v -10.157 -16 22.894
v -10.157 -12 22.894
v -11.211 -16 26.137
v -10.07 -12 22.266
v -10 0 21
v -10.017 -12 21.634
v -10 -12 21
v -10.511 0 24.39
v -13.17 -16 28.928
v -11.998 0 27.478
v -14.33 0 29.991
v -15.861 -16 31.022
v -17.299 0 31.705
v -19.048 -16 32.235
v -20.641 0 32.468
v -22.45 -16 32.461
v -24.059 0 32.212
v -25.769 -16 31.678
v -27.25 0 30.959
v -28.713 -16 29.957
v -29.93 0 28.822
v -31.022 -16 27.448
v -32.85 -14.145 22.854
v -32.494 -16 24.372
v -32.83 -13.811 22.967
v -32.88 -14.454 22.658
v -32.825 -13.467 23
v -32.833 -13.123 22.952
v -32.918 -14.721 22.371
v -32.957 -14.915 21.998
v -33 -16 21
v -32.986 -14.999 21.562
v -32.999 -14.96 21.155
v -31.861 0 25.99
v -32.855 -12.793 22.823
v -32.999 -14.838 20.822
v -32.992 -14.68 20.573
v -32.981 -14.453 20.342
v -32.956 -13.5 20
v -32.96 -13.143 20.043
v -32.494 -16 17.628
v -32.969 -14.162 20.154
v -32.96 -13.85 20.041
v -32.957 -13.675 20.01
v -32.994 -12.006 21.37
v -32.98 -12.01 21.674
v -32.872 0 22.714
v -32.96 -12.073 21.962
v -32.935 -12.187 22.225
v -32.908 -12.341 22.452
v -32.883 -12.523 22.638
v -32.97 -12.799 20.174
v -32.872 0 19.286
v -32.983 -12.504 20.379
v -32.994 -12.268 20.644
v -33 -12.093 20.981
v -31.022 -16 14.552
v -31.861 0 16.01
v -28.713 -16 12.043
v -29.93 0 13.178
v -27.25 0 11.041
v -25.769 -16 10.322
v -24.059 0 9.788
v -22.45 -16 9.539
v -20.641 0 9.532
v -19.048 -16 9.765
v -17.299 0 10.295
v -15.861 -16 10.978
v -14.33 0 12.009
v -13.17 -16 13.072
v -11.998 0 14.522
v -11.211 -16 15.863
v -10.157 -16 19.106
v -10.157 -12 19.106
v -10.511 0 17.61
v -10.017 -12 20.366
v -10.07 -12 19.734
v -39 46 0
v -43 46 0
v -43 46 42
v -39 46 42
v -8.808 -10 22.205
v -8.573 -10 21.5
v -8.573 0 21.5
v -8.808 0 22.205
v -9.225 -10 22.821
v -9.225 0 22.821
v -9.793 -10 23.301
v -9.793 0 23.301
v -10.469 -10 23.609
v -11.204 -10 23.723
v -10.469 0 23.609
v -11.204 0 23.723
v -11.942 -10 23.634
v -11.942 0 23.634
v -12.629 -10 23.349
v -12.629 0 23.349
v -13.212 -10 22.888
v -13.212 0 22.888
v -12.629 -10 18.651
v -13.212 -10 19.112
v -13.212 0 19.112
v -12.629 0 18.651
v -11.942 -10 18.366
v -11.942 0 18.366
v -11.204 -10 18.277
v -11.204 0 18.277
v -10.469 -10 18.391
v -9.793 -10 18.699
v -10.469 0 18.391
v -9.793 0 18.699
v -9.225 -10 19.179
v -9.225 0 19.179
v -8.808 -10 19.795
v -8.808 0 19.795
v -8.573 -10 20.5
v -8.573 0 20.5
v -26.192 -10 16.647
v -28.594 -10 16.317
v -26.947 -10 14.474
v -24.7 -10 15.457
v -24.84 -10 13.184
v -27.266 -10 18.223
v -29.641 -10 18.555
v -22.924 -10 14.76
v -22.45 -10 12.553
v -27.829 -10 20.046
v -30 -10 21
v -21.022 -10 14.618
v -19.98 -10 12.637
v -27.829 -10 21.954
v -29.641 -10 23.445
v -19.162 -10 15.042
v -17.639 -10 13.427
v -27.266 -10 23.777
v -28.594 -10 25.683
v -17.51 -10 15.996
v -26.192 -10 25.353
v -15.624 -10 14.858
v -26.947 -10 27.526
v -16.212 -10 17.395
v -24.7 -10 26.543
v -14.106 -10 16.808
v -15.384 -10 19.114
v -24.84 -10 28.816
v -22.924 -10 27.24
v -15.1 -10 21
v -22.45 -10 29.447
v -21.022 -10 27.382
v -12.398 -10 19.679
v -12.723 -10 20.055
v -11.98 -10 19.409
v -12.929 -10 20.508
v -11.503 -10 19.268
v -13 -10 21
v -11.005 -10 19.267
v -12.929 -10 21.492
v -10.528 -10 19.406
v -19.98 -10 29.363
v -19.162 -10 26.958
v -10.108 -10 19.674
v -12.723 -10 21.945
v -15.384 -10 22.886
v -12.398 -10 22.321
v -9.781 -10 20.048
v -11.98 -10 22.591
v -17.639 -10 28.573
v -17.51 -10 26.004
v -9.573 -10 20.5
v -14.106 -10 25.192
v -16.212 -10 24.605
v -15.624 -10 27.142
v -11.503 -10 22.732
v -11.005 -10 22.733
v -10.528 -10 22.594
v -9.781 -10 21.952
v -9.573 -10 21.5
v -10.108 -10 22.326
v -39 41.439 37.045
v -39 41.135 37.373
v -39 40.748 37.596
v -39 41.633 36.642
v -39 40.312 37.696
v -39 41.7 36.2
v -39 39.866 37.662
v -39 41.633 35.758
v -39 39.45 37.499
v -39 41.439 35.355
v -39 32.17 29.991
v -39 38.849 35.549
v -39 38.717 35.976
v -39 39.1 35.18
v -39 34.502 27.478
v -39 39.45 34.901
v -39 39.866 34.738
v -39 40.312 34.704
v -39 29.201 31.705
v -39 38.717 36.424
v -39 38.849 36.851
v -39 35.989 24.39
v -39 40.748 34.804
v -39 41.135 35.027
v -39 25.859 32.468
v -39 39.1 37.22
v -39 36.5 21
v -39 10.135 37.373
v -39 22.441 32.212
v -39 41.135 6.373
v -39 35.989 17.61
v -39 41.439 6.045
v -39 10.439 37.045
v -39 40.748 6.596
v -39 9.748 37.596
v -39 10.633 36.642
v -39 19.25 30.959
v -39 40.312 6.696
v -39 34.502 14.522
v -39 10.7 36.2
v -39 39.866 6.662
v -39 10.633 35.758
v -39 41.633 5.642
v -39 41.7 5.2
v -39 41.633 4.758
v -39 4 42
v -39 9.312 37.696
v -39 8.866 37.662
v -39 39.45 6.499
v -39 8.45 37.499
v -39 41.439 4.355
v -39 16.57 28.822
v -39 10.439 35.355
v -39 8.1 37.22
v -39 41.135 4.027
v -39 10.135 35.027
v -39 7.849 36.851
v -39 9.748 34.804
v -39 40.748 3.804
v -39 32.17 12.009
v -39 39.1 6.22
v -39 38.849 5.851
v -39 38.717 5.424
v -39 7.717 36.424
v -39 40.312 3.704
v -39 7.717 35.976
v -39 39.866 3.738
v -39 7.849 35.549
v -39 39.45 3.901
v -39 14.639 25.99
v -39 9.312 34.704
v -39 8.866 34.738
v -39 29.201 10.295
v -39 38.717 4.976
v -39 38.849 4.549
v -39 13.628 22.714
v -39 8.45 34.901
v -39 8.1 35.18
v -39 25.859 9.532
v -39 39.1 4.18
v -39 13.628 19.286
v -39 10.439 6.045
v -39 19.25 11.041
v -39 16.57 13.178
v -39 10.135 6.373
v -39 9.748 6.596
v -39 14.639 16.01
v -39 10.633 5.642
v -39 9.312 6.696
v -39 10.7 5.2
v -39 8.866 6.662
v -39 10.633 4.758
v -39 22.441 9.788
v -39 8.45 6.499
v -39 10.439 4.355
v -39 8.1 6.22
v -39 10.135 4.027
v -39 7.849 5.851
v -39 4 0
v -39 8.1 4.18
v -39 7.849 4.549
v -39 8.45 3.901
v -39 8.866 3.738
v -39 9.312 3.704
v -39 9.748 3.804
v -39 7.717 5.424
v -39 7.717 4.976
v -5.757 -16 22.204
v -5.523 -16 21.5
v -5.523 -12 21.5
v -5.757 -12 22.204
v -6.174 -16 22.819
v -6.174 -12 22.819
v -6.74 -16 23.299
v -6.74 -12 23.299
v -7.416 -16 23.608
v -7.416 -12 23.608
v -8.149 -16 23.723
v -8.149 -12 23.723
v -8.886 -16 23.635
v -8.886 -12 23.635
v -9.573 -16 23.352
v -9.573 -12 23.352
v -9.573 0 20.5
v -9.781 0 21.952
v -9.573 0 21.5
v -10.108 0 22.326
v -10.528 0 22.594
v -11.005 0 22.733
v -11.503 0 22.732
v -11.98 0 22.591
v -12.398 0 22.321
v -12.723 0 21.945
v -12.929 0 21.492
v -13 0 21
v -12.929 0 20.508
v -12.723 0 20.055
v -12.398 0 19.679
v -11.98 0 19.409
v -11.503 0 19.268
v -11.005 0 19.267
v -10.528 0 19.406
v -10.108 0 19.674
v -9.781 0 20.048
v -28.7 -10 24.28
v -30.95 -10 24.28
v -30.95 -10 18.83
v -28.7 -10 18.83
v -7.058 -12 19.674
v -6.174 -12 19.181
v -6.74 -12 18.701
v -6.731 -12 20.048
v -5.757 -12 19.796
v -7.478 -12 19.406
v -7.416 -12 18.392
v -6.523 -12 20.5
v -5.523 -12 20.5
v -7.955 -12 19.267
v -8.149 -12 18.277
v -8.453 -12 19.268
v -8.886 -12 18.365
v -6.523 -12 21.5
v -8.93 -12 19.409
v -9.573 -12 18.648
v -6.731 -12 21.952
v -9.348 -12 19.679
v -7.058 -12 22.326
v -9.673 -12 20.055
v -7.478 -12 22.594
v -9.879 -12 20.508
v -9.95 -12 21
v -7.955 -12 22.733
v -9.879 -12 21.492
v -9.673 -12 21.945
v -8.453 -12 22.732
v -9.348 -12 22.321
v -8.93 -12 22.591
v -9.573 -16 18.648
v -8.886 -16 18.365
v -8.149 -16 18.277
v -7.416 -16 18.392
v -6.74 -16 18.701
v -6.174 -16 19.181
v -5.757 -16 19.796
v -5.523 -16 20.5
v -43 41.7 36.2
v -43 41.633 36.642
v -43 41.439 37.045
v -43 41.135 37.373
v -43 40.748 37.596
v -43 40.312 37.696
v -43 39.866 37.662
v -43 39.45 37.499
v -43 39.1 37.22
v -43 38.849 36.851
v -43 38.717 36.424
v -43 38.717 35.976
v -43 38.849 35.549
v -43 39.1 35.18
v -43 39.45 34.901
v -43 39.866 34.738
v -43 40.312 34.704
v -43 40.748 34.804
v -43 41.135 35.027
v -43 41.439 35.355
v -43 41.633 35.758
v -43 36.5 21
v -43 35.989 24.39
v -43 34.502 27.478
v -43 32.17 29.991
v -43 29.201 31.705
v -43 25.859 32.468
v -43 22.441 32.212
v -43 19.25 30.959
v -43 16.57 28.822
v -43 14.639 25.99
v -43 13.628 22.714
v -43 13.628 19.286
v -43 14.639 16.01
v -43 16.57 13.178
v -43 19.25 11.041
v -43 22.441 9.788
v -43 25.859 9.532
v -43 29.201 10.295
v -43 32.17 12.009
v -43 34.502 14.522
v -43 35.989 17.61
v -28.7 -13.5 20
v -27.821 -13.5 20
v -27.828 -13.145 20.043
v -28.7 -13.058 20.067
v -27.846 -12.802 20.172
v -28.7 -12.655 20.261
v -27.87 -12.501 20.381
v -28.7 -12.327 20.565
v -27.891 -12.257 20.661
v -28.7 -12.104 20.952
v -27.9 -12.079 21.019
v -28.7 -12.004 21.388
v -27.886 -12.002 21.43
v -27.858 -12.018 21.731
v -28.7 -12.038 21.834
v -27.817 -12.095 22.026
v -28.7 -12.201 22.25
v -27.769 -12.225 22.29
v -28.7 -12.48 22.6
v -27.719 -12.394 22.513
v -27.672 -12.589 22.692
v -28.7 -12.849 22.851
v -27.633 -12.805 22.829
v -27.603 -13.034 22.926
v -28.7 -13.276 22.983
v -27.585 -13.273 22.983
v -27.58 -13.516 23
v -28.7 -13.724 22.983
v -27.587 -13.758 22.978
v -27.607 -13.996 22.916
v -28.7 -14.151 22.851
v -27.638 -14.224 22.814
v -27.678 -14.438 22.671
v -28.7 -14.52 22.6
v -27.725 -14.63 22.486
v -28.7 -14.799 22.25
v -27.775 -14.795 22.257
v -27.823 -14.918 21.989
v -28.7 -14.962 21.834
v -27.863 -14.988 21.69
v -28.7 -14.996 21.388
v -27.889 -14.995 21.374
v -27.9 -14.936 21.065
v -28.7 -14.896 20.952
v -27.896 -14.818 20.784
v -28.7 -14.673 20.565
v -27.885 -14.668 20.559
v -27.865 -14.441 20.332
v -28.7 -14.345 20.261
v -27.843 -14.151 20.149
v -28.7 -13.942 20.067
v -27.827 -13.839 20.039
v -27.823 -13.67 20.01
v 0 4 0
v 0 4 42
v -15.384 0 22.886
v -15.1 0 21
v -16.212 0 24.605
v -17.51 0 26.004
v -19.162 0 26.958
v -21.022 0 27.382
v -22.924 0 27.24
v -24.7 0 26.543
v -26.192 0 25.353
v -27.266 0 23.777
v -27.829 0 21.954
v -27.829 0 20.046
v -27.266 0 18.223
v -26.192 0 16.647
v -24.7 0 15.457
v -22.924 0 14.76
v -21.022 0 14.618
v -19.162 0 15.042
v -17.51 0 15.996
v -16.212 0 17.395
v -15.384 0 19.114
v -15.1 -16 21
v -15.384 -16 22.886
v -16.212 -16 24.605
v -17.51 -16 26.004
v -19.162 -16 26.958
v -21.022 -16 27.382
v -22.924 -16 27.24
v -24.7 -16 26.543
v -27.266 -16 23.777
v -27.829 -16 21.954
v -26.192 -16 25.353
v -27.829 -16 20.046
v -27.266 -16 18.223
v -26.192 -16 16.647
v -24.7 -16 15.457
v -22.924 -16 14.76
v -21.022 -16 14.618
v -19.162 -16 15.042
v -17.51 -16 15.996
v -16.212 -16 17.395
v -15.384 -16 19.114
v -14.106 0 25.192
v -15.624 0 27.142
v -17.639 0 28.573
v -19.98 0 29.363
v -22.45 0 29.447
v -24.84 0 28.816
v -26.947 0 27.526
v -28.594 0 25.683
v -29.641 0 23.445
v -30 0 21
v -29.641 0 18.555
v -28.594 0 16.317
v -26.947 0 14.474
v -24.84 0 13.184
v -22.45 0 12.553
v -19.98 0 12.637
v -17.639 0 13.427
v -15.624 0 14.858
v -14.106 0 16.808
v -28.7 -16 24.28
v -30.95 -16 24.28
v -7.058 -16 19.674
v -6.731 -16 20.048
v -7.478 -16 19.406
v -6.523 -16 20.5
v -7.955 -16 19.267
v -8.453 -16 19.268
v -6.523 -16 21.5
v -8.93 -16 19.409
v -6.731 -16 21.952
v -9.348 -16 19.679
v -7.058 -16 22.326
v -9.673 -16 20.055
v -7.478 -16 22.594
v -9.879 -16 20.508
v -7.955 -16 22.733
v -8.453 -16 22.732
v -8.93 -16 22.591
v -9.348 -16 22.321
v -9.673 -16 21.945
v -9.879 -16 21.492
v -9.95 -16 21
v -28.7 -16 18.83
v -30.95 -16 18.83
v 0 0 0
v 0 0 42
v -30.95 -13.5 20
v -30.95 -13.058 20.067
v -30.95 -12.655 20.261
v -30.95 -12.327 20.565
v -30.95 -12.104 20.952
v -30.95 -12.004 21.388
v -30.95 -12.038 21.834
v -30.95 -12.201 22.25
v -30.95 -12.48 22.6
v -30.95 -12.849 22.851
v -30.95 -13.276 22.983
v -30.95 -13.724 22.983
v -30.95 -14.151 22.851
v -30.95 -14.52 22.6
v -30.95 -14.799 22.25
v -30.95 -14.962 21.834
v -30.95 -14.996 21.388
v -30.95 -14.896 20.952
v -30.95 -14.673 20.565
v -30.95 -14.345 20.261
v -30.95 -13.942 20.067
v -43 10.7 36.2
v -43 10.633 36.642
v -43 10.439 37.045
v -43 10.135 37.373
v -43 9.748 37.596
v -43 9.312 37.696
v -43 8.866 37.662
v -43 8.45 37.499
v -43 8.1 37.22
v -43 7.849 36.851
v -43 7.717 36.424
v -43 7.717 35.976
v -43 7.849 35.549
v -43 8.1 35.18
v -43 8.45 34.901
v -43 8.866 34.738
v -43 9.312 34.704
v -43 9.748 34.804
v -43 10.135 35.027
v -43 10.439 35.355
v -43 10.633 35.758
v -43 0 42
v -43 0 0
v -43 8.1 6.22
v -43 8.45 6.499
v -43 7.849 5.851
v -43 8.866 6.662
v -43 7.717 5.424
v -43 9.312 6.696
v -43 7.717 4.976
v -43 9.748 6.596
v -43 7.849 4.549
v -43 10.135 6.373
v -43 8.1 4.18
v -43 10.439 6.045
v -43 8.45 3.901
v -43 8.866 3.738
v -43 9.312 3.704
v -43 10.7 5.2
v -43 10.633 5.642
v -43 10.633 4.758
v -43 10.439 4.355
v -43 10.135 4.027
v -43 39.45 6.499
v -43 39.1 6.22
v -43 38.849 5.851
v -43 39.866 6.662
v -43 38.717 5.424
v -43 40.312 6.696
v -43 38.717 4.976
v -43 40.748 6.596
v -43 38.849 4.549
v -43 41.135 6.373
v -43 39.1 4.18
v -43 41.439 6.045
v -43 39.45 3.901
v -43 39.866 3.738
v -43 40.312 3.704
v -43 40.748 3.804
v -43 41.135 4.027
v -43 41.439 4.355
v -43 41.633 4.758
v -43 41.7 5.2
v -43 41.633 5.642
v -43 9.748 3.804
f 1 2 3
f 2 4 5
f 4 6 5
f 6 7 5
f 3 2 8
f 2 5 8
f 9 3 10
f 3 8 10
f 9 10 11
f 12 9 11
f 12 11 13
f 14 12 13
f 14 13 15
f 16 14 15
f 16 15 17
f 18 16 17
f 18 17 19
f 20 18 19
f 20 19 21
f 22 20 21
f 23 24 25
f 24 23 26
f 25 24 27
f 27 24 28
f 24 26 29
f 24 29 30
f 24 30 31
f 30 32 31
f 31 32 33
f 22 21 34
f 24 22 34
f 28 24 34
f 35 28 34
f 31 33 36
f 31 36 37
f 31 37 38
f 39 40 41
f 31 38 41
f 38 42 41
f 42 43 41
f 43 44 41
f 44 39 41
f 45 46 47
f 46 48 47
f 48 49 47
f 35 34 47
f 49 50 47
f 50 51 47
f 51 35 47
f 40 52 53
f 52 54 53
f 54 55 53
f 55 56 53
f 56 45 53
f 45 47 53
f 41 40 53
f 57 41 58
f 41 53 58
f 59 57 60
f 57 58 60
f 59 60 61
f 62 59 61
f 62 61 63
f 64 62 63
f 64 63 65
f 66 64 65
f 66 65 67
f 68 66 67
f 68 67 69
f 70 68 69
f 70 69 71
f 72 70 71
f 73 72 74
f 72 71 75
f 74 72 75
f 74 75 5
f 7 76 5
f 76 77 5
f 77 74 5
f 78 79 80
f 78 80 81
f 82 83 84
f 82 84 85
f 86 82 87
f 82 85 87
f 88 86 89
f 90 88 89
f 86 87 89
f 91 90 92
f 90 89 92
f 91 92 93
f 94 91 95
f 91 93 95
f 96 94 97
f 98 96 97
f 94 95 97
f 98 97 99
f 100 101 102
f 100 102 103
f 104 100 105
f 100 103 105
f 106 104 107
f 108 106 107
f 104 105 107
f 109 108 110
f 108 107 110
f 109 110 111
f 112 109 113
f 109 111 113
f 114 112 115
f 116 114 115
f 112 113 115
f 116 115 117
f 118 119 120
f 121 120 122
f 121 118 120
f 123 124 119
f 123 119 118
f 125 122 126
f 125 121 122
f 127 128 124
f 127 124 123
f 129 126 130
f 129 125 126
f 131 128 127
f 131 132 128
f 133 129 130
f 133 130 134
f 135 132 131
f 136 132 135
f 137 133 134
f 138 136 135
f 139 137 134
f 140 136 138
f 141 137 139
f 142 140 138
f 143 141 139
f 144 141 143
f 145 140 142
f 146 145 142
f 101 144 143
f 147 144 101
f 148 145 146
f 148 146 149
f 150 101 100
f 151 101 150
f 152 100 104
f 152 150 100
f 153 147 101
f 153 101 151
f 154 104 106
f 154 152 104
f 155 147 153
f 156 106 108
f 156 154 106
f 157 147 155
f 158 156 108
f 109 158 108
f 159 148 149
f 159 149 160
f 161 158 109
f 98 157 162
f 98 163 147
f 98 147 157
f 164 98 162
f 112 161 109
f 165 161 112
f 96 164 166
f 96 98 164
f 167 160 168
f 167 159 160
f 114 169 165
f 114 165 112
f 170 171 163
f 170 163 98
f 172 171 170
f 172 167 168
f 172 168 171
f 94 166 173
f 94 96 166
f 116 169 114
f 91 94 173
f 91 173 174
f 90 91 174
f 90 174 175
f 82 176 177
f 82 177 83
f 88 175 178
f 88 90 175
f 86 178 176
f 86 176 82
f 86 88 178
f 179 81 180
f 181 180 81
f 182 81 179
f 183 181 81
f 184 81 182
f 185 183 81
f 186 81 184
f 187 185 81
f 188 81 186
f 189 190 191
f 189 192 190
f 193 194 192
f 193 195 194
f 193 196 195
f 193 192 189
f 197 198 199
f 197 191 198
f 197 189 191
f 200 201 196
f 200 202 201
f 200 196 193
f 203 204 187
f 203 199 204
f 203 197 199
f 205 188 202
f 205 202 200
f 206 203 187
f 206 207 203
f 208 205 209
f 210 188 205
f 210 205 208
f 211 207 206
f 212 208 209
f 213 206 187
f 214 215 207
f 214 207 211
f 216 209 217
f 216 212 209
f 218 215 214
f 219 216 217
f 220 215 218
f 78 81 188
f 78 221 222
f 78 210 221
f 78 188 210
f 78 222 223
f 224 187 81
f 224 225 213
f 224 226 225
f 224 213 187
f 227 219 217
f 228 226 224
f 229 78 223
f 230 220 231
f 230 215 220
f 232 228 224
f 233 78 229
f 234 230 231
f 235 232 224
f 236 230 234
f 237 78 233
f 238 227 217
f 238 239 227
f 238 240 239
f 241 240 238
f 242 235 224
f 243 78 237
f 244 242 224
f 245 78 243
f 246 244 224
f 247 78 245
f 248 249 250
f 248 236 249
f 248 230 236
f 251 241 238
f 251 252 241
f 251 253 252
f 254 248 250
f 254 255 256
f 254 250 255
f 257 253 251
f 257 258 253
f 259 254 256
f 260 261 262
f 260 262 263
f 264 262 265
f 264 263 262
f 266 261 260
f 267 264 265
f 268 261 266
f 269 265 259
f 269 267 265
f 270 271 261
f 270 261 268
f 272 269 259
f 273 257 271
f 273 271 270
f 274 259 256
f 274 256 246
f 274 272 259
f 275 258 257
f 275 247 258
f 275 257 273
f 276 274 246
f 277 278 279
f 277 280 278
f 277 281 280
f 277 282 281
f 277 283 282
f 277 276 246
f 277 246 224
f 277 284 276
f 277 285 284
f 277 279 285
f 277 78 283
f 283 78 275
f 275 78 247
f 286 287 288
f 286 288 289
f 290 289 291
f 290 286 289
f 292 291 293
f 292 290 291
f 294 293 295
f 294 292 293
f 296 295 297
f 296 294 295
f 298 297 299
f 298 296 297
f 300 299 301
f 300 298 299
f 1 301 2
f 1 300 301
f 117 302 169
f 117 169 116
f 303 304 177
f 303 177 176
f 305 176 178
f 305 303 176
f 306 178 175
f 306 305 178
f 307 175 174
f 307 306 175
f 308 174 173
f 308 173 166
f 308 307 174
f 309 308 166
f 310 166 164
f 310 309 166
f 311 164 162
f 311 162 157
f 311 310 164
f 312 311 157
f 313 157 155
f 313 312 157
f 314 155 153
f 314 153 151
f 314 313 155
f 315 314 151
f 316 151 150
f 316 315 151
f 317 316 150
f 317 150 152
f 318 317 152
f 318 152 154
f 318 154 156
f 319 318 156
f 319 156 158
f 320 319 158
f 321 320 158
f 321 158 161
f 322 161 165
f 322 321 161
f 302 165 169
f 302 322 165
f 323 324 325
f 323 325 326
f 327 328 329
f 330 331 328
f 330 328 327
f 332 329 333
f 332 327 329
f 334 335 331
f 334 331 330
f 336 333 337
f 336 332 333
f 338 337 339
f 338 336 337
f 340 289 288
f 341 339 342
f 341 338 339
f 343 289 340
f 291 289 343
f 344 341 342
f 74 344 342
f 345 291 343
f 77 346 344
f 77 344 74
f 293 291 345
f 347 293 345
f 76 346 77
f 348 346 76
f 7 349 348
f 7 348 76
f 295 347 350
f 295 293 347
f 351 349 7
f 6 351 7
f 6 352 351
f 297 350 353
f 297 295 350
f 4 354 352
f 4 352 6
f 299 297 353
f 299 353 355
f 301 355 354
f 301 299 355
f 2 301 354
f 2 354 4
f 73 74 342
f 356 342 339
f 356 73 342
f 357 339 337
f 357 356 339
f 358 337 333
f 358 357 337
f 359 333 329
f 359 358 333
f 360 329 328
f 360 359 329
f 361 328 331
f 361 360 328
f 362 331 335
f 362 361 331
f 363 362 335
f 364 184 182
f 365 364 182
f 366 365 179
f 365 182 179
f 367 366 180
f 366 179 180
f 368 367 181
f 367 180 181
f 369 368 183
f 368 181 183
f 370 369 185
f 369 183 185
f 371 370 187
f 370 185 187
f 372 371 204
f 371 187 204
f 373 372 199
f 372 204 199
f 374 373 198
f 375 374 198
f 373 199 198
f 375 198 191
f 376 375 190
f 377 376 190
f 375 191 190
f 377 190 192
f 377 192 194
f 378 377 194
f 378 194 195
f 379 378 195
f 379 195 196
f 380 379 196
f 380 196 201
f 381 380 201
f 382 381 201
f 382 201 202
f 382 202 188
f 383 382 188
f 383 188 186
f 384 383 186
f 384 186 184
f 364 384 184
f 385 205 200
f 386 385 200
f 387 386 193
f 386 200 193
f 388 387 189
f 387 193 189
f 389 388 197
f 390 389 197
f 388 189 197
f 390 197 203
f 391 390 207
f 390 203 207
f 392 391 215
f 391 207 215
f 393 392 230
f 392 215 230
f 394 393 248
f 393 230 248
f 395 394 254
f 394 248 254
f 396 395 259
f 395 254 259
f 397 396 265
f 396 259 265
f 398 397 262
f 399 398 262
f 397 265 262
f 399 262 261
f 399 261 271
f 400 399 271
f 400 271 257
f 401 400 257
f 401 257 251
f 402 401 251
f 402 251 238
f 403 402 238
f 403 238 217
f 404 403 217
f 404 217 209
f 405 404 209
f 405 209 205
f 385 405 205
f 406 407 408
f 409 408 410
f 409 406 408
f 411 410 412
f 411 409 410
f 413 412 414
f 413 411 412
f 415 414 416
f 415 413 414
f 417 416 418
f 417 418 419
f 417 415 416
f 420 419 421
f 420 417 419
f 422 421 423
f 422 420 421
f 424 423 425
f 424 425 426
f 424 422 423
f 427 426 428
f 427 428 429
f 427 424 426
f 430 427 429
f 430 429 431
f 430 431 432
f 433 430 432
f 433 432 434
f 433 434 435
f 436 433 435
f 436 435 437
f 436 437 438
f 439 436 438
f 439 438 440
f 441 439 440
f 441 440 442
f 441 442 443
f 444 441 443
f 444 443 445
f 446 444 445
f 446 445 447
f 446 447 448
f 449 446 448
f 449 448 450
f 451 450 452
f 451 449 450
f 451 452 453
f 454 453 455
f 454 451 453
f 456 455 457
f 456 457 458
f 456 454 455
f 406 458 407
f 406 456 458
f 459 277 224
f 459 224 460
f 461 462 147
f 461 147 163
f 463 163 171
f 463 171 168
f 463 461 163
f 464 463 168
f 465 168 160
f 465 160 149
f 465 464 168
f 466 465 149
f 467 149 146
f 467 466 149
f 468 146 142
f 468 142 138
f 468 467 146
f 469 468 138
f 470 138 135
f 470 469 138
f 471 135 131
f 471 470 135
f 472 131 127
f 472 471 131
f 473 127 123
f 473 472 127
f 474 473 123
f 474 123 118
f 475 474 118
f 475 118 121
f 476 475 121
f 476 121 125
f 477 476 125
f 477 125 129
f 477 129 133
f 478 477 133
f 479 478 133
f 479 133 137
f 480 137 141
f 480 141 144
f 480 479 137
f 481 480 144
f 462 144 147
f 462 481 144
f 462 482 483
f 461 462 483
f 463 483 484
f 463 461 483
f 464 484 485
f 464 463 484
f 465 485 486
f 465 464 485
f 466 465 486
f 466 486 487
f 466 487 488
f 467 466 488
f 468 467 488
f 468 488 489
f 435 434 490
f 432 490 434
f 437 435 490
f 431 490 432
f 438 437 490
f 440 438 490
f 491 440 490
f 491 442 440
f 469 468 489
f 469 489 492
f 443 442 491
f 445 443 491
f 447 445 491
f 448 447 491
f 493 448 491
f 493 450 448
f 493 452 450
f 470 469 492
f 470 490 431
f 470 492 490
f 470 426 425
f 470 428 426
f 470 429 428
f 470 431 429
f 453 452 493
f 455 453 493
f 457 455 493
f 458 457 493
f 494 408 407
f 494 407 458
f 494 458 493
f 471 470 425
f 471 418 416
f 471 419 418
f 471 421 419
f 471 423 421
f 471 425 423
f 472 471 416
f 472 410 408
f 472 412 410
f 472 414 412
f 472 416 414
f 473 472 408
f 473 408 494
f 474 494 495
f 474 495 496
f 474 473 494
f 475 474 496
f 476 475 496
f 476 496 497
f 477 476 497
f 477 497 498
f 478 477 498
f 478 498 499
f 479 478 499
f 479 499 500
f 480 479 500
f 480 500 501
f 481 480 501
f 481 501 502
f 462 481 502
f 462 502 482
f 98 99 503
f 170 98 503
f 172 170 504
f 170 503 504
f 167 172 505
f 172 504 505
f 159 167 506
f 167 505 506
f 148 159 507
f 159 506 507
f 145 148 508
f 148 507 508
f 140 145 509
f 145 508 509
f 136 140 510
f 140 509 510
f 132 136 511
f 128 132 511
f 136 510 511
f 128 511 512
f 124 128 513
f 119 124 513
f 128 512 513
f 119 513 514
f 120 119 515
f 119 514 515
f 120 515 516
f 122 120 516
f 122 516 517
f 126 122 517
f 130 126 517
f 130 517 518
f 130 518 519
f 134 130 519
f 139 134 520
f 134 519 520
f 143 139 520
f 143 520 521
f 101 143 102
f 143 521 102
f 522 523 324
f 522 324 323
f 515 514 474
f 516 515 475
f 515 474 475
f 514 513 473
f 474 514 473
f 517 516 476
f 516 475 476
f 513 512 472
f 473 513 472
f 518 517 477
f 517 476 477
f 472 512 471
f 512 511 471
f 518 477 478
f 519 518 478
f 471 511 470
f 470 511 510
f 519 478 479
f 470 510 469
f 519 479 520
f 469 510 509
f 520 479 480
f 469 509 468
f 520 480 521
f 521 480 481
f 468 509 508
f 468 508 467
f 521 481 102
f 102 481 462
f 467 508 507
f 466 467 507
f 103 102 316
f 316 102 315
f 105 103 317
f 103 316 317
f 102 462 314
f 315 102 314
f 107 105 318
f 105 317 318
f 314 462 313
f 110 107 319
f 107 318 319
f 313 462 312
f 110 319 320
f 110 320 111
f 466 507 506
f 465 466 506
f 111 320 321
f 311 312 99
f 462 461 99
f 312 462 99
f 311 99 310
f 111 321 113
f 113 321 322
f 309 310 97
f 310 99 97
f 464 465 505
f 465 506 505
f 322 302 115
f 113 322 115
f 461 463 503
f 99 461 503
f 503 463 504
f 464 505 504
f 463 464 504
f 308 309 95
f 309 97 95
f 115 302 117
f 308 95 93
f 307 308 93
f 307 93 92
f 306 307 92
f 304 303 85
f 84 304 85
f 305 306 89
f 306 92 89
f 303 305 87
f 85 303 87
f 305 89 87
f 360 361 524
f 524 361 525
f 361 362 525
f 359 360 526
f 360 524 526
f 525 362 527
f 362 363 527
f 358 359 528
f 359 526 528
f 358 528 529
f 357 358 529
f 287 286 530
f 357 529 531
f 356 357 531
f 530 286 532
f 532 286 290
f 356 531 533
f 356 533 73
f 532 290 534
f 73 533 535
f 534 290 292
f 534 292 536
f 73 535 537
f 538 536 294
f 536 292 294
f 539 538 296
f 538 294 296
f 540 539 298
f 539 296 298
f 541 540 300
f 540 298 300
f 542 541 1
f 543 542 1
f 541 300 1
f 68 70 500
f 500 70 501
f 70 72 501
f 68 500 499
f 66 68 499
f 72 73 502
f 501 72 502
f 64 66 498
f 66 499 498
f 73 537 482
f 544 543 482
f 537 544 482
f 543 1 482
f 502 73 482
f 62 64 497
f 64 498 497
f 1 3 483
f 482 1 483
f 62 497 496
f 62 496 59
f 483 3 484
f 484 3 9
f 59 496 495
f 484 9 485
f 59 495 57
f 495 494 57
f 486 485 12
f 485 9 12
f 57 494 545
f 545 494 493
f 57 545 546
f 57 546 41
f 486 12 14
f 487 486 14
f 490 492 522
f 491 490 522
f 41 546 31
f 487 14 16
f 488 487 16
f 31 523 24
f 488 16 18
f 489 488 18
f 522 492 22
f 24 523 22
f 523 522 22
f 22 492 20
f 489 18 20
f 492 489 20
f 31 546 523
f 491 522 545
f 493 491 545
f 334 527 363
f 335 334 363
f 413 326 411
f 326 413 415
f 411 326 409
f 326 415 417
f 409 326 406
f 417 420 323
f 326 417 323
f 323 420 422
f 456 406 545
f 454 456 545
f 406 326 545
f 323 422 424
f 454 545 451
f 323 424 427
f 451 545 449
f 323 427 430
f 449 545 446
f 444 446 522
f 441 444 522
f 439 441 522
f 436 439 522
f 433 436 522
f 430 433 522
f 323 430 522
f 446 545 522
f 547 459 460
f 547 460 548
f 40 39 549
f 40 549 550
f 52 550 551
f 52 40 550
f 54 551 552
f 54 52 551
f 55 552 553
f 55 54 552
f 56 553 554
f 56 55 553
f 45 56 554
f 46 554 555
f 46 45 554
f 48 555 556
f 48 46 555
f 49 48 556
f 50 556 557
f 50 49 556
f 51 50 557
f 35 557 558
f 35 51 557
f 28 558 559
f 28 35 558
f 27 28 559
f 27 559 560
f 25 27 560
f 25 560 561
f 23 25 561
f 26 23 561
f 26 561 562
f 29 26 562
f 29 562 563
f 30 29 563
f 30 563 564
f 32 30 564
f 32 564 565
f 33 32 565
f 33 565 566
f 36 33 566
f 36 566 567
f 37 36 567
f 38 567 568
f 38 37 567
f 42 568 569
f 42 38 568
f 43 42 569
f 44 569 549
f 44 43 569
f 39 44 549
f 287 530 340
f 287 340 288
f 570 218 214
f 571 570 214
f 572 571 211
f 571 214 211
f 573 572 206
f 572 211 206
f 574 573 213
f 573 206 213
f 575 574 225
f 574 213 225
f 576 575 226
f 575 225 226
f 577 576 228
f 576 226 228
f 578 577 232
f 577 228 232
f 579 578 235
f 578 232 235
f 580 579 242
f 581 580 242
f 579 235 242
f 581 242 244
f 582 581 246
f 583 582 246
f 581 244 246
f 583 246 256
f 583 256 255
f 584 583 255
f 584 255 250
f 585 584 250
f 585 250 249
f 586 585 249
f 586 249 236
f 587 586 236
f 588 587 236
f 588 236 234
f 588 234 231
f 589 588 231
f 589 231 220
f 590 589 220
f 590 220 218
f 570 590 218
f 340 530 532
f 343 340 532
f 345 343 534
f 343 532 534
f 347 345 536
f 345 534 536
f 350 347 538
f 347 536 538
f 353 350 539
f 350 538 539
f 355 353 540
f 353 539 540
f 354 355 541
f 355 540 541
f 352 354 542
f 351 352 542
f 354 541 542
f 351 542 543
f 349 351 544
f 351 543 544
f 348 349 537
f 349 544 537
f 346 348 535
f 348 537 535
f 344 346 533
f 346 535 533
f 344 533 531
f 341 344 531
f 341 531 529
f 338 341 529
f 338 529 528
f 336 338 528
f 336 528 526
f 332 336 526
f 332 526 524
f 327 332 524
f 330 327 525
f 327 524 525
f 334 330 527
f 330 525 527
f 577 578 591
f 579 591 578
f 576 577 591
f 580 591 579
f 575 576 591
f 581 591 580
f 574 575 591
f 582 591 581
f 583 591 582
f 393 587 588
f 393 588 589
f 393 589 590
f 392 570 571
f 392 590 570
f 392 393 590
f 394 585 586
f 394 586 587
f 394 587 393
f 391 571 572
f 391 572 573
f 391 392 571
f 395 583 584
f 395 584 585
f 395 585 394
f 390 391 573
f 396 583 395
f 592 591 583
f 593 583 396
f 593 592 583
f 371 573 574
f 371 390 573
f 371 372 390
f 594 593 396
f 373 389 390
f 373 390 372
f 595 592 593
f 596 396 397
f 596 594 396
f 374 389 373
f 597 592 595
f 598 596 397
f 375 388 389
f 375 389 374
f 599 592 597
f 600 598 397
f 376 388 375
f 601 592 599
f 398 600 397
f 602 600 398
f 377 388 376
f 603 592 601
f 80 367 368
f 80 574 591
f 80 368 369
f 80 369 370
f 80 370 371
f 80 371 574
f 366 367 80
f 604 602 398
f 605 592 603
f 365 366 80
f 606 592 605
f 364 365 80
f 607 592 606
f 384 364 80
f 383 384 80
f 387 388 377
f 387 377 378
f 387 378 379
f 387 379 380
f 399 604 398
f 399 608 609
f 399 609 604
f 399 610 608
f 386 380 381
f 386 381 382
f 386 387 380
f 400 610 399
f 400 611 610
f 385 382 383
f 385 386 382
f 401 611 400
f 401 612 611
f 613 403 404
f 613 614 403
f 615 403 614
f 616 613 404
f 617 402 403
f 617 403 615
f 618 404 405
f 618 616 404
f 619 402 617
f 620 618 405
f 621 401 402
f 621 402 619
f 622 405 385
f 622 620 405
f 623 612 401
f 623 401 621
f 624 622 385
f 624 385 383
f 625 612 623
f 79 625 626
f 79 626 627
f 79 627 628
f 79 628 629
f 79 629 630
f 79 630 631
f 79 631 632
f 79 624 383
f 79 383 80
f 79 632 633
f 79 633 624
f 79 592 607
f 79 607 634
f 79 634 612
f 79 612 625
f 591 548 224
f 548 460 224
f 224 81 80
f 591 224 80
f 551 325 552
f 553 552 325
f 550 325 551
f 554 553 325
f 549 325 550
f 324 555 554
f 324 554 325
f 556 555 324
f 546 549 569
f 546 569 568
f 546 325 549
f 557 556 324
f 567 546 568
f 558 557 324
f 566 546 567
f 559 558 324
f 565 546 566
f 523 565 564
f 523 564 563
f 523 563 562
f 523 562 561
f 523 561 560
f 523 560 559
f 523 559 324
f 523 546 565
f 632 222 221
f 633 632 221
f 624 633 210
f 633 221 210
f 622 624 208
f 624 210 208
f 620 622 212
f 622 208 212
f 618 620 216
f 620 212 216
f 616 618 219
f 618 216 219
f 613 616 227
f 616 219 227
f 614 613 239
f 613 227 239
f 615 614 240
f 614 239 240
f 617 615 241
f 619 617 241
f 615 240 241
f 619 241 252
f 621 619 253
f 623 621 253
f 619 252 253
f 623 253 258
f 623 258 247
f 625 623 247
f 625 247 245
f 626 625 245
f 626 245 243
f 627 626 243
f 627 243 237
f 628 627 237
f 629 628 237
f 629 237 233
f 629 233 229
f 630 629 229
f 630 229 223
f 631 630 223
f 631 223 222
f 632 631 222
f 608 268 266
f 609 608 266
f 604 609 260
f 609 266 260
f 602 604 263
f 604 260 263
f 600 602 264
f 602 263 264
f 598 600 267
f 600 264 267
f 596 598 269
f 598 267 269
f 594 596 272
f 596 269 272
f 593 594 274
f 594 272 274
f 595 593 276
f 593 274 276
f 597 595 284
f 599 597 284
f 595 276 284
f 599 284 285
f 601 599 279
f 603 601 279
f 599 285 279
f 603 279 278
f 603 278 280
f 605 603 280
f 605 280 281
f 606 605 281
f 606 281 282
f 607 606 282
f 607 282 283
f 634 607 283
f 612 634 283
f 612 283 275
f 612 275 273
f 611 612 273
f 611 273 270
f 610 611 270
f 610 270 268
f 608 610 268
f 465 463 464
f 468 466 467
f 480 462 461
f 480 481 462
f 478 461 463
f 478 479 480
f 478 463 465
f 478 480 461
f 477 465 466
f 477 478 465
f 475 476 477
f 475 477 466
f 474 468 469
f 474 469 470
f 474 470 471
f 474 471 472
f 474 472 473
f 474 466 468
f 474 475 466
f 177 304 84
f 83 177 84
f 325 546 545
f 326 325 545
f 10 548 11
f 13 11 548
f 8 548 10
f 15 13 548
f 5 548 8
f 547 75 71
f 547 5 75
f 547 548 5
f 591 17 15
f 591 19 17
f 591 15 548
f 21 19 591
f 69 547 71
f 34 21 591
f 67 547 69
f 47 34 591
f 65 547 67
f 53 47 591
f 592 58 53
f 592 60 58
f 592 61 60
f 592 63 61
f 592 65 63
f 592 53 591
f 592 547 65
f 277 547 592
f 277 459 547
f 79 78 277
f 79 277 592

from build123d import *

# Parameters (mm, degrees)
SKETCH004_R     = 6.4
PAD003_DEPTH    = 10
CYLINDER_R      = 1.5
CYLINDER_DEPTH  = 10
PAD_DEPTH       = 42
SKETCH001_R     = 1.5
SKETCH001_R_2   = 11.5
POCKET_DEPTH    = 4.001
SKETCH002_R     = 11.5
SKETCH002_R_2   = 6.4
PAD001_DEPTH    = 16
PAD002_DEPTH    = 4
SKETCH005_W     = 2.25
SKETCH005_H     = 5.45
POCKET001_DEPTH = 6


with BuildPart() as body001:
    # Sketch004 → Pad003 (new body)
    with BuildSketch(Plane.XZ):
        with BuildLine():
            ThreePointArc((-13.212395, 22.888281), (-30, 21), (-13.212395, 19.111719))
            ThreePointArc((-13.212395, 19.111719), (-10.469286, 18.39096), (-8.572949, 20.5))
            Line((-9.572949, 20.5), (-8.572949, 20.5))
            ThreePointArc((-9.572949, 21.5), (-13, 21), (-9.572949, 20.5))
            Line((-9.572949, 21.5), (-8.572949, 21.5))
            ThreePointArc((-8.572949, 21.5), (-10.469286, 23.60904), (-13.212395, 22.888281))
        make_face()
        with Locations((-21.5, 21)):
            Circle(SKETCH004_R, mode=Mode.SUBTRACT)
    extrude(amount=PAD003_DEPTH)


with BuildPart() as cylinder:
    # Cylinder → Cylinder (new body)
    with BuildSketch(Plane(origin=(-35, -13.5, 21.5), x_dir=(0, 0, -1), z_dir=(1, 0, 0))):
        Circle(CYLINDER_R)
    extrude(amount=CYLINDER_DEPTH)


with BuildPart() as cut:
    # Sketch → Pad (new body)
    with BuildSketch(Plane.XY):
        Polygon((0, 0), (-43, 0), (-43, 46), (-39, 46), (-39, 4), (0, 4), align=None)
    extrude(amount=PAD_DEPTH)

    # Sketch001 (on Face4 of Pad) → Pocket (cut, through all)
    with BuildSketch(Plane.YZ.offset(-39)):
        with Locations((9.2, 36.2)):
            Circle(SKETCH001_R)
        with Locations((40.2, 36.2)):
            Circle(SKETCH001_R)
        with Locations((9.2, 5.2)):
            Circle(SKETCH001_R)
        with Locations((40.2, 5.2)):
            Circle(SKETCH001_R)
        with Locations((25, 21)):
            Circle(SKETCH001_R_2)
    extrude(amount=-POCKET_DEPTH, mode=Mode.SUBTRACT)

    # Sketch002 (on Face1 of Pocket) → Pad001 (join)
    with BuildSketch(Plane.XZ):
        with Locations((-21.5, 21)):
            Circle(SKETCH002_R)
        with Locations((-21.5, 21)):
            Circle(SKETCH002_R_2, mode=Mode.SUBTRACT)
    extrude(amount=PAD001_DEPTH)

    # Sketch003 (on Face15 of Pad001) → Pad002 (join)
    with BuildSketch(Plane.XZ.offset(16)):
        with BuildLine():
            ThreePointArc((-6.522949, 21.5), (-9.95, 21), (-6.522949, 20.5))
            Line((-6.522949, 20.5), (-5.522949, 20.5))
            ThreePointArc((-5.522949, 21.5), (-10.923344, 21), (-5.522949, 20.5))
            Line((-6.522949, 21.5), (-5.522949, 21.5))
        make_face()
    extrude(amount=-PAD002_DEPTH)

    # Sketch005 (on Face17 of Pad002) → Pocket001 (cut)
    with BuildSketch(Plane.XZ.offset(16)):
        with Locations((-29.825, 21.555)):
            Rectangle(SKETCH005_W, SKETCH005_H)
    extrude(amount=-POCKET001_DEPTH, mode=Mode.SUBTRACT)

    # Cut: cut Cylinder
    add(cylinder.part, mode=Mode.SUBTRACT)


solid = Compound([body001.part, cut.part])
